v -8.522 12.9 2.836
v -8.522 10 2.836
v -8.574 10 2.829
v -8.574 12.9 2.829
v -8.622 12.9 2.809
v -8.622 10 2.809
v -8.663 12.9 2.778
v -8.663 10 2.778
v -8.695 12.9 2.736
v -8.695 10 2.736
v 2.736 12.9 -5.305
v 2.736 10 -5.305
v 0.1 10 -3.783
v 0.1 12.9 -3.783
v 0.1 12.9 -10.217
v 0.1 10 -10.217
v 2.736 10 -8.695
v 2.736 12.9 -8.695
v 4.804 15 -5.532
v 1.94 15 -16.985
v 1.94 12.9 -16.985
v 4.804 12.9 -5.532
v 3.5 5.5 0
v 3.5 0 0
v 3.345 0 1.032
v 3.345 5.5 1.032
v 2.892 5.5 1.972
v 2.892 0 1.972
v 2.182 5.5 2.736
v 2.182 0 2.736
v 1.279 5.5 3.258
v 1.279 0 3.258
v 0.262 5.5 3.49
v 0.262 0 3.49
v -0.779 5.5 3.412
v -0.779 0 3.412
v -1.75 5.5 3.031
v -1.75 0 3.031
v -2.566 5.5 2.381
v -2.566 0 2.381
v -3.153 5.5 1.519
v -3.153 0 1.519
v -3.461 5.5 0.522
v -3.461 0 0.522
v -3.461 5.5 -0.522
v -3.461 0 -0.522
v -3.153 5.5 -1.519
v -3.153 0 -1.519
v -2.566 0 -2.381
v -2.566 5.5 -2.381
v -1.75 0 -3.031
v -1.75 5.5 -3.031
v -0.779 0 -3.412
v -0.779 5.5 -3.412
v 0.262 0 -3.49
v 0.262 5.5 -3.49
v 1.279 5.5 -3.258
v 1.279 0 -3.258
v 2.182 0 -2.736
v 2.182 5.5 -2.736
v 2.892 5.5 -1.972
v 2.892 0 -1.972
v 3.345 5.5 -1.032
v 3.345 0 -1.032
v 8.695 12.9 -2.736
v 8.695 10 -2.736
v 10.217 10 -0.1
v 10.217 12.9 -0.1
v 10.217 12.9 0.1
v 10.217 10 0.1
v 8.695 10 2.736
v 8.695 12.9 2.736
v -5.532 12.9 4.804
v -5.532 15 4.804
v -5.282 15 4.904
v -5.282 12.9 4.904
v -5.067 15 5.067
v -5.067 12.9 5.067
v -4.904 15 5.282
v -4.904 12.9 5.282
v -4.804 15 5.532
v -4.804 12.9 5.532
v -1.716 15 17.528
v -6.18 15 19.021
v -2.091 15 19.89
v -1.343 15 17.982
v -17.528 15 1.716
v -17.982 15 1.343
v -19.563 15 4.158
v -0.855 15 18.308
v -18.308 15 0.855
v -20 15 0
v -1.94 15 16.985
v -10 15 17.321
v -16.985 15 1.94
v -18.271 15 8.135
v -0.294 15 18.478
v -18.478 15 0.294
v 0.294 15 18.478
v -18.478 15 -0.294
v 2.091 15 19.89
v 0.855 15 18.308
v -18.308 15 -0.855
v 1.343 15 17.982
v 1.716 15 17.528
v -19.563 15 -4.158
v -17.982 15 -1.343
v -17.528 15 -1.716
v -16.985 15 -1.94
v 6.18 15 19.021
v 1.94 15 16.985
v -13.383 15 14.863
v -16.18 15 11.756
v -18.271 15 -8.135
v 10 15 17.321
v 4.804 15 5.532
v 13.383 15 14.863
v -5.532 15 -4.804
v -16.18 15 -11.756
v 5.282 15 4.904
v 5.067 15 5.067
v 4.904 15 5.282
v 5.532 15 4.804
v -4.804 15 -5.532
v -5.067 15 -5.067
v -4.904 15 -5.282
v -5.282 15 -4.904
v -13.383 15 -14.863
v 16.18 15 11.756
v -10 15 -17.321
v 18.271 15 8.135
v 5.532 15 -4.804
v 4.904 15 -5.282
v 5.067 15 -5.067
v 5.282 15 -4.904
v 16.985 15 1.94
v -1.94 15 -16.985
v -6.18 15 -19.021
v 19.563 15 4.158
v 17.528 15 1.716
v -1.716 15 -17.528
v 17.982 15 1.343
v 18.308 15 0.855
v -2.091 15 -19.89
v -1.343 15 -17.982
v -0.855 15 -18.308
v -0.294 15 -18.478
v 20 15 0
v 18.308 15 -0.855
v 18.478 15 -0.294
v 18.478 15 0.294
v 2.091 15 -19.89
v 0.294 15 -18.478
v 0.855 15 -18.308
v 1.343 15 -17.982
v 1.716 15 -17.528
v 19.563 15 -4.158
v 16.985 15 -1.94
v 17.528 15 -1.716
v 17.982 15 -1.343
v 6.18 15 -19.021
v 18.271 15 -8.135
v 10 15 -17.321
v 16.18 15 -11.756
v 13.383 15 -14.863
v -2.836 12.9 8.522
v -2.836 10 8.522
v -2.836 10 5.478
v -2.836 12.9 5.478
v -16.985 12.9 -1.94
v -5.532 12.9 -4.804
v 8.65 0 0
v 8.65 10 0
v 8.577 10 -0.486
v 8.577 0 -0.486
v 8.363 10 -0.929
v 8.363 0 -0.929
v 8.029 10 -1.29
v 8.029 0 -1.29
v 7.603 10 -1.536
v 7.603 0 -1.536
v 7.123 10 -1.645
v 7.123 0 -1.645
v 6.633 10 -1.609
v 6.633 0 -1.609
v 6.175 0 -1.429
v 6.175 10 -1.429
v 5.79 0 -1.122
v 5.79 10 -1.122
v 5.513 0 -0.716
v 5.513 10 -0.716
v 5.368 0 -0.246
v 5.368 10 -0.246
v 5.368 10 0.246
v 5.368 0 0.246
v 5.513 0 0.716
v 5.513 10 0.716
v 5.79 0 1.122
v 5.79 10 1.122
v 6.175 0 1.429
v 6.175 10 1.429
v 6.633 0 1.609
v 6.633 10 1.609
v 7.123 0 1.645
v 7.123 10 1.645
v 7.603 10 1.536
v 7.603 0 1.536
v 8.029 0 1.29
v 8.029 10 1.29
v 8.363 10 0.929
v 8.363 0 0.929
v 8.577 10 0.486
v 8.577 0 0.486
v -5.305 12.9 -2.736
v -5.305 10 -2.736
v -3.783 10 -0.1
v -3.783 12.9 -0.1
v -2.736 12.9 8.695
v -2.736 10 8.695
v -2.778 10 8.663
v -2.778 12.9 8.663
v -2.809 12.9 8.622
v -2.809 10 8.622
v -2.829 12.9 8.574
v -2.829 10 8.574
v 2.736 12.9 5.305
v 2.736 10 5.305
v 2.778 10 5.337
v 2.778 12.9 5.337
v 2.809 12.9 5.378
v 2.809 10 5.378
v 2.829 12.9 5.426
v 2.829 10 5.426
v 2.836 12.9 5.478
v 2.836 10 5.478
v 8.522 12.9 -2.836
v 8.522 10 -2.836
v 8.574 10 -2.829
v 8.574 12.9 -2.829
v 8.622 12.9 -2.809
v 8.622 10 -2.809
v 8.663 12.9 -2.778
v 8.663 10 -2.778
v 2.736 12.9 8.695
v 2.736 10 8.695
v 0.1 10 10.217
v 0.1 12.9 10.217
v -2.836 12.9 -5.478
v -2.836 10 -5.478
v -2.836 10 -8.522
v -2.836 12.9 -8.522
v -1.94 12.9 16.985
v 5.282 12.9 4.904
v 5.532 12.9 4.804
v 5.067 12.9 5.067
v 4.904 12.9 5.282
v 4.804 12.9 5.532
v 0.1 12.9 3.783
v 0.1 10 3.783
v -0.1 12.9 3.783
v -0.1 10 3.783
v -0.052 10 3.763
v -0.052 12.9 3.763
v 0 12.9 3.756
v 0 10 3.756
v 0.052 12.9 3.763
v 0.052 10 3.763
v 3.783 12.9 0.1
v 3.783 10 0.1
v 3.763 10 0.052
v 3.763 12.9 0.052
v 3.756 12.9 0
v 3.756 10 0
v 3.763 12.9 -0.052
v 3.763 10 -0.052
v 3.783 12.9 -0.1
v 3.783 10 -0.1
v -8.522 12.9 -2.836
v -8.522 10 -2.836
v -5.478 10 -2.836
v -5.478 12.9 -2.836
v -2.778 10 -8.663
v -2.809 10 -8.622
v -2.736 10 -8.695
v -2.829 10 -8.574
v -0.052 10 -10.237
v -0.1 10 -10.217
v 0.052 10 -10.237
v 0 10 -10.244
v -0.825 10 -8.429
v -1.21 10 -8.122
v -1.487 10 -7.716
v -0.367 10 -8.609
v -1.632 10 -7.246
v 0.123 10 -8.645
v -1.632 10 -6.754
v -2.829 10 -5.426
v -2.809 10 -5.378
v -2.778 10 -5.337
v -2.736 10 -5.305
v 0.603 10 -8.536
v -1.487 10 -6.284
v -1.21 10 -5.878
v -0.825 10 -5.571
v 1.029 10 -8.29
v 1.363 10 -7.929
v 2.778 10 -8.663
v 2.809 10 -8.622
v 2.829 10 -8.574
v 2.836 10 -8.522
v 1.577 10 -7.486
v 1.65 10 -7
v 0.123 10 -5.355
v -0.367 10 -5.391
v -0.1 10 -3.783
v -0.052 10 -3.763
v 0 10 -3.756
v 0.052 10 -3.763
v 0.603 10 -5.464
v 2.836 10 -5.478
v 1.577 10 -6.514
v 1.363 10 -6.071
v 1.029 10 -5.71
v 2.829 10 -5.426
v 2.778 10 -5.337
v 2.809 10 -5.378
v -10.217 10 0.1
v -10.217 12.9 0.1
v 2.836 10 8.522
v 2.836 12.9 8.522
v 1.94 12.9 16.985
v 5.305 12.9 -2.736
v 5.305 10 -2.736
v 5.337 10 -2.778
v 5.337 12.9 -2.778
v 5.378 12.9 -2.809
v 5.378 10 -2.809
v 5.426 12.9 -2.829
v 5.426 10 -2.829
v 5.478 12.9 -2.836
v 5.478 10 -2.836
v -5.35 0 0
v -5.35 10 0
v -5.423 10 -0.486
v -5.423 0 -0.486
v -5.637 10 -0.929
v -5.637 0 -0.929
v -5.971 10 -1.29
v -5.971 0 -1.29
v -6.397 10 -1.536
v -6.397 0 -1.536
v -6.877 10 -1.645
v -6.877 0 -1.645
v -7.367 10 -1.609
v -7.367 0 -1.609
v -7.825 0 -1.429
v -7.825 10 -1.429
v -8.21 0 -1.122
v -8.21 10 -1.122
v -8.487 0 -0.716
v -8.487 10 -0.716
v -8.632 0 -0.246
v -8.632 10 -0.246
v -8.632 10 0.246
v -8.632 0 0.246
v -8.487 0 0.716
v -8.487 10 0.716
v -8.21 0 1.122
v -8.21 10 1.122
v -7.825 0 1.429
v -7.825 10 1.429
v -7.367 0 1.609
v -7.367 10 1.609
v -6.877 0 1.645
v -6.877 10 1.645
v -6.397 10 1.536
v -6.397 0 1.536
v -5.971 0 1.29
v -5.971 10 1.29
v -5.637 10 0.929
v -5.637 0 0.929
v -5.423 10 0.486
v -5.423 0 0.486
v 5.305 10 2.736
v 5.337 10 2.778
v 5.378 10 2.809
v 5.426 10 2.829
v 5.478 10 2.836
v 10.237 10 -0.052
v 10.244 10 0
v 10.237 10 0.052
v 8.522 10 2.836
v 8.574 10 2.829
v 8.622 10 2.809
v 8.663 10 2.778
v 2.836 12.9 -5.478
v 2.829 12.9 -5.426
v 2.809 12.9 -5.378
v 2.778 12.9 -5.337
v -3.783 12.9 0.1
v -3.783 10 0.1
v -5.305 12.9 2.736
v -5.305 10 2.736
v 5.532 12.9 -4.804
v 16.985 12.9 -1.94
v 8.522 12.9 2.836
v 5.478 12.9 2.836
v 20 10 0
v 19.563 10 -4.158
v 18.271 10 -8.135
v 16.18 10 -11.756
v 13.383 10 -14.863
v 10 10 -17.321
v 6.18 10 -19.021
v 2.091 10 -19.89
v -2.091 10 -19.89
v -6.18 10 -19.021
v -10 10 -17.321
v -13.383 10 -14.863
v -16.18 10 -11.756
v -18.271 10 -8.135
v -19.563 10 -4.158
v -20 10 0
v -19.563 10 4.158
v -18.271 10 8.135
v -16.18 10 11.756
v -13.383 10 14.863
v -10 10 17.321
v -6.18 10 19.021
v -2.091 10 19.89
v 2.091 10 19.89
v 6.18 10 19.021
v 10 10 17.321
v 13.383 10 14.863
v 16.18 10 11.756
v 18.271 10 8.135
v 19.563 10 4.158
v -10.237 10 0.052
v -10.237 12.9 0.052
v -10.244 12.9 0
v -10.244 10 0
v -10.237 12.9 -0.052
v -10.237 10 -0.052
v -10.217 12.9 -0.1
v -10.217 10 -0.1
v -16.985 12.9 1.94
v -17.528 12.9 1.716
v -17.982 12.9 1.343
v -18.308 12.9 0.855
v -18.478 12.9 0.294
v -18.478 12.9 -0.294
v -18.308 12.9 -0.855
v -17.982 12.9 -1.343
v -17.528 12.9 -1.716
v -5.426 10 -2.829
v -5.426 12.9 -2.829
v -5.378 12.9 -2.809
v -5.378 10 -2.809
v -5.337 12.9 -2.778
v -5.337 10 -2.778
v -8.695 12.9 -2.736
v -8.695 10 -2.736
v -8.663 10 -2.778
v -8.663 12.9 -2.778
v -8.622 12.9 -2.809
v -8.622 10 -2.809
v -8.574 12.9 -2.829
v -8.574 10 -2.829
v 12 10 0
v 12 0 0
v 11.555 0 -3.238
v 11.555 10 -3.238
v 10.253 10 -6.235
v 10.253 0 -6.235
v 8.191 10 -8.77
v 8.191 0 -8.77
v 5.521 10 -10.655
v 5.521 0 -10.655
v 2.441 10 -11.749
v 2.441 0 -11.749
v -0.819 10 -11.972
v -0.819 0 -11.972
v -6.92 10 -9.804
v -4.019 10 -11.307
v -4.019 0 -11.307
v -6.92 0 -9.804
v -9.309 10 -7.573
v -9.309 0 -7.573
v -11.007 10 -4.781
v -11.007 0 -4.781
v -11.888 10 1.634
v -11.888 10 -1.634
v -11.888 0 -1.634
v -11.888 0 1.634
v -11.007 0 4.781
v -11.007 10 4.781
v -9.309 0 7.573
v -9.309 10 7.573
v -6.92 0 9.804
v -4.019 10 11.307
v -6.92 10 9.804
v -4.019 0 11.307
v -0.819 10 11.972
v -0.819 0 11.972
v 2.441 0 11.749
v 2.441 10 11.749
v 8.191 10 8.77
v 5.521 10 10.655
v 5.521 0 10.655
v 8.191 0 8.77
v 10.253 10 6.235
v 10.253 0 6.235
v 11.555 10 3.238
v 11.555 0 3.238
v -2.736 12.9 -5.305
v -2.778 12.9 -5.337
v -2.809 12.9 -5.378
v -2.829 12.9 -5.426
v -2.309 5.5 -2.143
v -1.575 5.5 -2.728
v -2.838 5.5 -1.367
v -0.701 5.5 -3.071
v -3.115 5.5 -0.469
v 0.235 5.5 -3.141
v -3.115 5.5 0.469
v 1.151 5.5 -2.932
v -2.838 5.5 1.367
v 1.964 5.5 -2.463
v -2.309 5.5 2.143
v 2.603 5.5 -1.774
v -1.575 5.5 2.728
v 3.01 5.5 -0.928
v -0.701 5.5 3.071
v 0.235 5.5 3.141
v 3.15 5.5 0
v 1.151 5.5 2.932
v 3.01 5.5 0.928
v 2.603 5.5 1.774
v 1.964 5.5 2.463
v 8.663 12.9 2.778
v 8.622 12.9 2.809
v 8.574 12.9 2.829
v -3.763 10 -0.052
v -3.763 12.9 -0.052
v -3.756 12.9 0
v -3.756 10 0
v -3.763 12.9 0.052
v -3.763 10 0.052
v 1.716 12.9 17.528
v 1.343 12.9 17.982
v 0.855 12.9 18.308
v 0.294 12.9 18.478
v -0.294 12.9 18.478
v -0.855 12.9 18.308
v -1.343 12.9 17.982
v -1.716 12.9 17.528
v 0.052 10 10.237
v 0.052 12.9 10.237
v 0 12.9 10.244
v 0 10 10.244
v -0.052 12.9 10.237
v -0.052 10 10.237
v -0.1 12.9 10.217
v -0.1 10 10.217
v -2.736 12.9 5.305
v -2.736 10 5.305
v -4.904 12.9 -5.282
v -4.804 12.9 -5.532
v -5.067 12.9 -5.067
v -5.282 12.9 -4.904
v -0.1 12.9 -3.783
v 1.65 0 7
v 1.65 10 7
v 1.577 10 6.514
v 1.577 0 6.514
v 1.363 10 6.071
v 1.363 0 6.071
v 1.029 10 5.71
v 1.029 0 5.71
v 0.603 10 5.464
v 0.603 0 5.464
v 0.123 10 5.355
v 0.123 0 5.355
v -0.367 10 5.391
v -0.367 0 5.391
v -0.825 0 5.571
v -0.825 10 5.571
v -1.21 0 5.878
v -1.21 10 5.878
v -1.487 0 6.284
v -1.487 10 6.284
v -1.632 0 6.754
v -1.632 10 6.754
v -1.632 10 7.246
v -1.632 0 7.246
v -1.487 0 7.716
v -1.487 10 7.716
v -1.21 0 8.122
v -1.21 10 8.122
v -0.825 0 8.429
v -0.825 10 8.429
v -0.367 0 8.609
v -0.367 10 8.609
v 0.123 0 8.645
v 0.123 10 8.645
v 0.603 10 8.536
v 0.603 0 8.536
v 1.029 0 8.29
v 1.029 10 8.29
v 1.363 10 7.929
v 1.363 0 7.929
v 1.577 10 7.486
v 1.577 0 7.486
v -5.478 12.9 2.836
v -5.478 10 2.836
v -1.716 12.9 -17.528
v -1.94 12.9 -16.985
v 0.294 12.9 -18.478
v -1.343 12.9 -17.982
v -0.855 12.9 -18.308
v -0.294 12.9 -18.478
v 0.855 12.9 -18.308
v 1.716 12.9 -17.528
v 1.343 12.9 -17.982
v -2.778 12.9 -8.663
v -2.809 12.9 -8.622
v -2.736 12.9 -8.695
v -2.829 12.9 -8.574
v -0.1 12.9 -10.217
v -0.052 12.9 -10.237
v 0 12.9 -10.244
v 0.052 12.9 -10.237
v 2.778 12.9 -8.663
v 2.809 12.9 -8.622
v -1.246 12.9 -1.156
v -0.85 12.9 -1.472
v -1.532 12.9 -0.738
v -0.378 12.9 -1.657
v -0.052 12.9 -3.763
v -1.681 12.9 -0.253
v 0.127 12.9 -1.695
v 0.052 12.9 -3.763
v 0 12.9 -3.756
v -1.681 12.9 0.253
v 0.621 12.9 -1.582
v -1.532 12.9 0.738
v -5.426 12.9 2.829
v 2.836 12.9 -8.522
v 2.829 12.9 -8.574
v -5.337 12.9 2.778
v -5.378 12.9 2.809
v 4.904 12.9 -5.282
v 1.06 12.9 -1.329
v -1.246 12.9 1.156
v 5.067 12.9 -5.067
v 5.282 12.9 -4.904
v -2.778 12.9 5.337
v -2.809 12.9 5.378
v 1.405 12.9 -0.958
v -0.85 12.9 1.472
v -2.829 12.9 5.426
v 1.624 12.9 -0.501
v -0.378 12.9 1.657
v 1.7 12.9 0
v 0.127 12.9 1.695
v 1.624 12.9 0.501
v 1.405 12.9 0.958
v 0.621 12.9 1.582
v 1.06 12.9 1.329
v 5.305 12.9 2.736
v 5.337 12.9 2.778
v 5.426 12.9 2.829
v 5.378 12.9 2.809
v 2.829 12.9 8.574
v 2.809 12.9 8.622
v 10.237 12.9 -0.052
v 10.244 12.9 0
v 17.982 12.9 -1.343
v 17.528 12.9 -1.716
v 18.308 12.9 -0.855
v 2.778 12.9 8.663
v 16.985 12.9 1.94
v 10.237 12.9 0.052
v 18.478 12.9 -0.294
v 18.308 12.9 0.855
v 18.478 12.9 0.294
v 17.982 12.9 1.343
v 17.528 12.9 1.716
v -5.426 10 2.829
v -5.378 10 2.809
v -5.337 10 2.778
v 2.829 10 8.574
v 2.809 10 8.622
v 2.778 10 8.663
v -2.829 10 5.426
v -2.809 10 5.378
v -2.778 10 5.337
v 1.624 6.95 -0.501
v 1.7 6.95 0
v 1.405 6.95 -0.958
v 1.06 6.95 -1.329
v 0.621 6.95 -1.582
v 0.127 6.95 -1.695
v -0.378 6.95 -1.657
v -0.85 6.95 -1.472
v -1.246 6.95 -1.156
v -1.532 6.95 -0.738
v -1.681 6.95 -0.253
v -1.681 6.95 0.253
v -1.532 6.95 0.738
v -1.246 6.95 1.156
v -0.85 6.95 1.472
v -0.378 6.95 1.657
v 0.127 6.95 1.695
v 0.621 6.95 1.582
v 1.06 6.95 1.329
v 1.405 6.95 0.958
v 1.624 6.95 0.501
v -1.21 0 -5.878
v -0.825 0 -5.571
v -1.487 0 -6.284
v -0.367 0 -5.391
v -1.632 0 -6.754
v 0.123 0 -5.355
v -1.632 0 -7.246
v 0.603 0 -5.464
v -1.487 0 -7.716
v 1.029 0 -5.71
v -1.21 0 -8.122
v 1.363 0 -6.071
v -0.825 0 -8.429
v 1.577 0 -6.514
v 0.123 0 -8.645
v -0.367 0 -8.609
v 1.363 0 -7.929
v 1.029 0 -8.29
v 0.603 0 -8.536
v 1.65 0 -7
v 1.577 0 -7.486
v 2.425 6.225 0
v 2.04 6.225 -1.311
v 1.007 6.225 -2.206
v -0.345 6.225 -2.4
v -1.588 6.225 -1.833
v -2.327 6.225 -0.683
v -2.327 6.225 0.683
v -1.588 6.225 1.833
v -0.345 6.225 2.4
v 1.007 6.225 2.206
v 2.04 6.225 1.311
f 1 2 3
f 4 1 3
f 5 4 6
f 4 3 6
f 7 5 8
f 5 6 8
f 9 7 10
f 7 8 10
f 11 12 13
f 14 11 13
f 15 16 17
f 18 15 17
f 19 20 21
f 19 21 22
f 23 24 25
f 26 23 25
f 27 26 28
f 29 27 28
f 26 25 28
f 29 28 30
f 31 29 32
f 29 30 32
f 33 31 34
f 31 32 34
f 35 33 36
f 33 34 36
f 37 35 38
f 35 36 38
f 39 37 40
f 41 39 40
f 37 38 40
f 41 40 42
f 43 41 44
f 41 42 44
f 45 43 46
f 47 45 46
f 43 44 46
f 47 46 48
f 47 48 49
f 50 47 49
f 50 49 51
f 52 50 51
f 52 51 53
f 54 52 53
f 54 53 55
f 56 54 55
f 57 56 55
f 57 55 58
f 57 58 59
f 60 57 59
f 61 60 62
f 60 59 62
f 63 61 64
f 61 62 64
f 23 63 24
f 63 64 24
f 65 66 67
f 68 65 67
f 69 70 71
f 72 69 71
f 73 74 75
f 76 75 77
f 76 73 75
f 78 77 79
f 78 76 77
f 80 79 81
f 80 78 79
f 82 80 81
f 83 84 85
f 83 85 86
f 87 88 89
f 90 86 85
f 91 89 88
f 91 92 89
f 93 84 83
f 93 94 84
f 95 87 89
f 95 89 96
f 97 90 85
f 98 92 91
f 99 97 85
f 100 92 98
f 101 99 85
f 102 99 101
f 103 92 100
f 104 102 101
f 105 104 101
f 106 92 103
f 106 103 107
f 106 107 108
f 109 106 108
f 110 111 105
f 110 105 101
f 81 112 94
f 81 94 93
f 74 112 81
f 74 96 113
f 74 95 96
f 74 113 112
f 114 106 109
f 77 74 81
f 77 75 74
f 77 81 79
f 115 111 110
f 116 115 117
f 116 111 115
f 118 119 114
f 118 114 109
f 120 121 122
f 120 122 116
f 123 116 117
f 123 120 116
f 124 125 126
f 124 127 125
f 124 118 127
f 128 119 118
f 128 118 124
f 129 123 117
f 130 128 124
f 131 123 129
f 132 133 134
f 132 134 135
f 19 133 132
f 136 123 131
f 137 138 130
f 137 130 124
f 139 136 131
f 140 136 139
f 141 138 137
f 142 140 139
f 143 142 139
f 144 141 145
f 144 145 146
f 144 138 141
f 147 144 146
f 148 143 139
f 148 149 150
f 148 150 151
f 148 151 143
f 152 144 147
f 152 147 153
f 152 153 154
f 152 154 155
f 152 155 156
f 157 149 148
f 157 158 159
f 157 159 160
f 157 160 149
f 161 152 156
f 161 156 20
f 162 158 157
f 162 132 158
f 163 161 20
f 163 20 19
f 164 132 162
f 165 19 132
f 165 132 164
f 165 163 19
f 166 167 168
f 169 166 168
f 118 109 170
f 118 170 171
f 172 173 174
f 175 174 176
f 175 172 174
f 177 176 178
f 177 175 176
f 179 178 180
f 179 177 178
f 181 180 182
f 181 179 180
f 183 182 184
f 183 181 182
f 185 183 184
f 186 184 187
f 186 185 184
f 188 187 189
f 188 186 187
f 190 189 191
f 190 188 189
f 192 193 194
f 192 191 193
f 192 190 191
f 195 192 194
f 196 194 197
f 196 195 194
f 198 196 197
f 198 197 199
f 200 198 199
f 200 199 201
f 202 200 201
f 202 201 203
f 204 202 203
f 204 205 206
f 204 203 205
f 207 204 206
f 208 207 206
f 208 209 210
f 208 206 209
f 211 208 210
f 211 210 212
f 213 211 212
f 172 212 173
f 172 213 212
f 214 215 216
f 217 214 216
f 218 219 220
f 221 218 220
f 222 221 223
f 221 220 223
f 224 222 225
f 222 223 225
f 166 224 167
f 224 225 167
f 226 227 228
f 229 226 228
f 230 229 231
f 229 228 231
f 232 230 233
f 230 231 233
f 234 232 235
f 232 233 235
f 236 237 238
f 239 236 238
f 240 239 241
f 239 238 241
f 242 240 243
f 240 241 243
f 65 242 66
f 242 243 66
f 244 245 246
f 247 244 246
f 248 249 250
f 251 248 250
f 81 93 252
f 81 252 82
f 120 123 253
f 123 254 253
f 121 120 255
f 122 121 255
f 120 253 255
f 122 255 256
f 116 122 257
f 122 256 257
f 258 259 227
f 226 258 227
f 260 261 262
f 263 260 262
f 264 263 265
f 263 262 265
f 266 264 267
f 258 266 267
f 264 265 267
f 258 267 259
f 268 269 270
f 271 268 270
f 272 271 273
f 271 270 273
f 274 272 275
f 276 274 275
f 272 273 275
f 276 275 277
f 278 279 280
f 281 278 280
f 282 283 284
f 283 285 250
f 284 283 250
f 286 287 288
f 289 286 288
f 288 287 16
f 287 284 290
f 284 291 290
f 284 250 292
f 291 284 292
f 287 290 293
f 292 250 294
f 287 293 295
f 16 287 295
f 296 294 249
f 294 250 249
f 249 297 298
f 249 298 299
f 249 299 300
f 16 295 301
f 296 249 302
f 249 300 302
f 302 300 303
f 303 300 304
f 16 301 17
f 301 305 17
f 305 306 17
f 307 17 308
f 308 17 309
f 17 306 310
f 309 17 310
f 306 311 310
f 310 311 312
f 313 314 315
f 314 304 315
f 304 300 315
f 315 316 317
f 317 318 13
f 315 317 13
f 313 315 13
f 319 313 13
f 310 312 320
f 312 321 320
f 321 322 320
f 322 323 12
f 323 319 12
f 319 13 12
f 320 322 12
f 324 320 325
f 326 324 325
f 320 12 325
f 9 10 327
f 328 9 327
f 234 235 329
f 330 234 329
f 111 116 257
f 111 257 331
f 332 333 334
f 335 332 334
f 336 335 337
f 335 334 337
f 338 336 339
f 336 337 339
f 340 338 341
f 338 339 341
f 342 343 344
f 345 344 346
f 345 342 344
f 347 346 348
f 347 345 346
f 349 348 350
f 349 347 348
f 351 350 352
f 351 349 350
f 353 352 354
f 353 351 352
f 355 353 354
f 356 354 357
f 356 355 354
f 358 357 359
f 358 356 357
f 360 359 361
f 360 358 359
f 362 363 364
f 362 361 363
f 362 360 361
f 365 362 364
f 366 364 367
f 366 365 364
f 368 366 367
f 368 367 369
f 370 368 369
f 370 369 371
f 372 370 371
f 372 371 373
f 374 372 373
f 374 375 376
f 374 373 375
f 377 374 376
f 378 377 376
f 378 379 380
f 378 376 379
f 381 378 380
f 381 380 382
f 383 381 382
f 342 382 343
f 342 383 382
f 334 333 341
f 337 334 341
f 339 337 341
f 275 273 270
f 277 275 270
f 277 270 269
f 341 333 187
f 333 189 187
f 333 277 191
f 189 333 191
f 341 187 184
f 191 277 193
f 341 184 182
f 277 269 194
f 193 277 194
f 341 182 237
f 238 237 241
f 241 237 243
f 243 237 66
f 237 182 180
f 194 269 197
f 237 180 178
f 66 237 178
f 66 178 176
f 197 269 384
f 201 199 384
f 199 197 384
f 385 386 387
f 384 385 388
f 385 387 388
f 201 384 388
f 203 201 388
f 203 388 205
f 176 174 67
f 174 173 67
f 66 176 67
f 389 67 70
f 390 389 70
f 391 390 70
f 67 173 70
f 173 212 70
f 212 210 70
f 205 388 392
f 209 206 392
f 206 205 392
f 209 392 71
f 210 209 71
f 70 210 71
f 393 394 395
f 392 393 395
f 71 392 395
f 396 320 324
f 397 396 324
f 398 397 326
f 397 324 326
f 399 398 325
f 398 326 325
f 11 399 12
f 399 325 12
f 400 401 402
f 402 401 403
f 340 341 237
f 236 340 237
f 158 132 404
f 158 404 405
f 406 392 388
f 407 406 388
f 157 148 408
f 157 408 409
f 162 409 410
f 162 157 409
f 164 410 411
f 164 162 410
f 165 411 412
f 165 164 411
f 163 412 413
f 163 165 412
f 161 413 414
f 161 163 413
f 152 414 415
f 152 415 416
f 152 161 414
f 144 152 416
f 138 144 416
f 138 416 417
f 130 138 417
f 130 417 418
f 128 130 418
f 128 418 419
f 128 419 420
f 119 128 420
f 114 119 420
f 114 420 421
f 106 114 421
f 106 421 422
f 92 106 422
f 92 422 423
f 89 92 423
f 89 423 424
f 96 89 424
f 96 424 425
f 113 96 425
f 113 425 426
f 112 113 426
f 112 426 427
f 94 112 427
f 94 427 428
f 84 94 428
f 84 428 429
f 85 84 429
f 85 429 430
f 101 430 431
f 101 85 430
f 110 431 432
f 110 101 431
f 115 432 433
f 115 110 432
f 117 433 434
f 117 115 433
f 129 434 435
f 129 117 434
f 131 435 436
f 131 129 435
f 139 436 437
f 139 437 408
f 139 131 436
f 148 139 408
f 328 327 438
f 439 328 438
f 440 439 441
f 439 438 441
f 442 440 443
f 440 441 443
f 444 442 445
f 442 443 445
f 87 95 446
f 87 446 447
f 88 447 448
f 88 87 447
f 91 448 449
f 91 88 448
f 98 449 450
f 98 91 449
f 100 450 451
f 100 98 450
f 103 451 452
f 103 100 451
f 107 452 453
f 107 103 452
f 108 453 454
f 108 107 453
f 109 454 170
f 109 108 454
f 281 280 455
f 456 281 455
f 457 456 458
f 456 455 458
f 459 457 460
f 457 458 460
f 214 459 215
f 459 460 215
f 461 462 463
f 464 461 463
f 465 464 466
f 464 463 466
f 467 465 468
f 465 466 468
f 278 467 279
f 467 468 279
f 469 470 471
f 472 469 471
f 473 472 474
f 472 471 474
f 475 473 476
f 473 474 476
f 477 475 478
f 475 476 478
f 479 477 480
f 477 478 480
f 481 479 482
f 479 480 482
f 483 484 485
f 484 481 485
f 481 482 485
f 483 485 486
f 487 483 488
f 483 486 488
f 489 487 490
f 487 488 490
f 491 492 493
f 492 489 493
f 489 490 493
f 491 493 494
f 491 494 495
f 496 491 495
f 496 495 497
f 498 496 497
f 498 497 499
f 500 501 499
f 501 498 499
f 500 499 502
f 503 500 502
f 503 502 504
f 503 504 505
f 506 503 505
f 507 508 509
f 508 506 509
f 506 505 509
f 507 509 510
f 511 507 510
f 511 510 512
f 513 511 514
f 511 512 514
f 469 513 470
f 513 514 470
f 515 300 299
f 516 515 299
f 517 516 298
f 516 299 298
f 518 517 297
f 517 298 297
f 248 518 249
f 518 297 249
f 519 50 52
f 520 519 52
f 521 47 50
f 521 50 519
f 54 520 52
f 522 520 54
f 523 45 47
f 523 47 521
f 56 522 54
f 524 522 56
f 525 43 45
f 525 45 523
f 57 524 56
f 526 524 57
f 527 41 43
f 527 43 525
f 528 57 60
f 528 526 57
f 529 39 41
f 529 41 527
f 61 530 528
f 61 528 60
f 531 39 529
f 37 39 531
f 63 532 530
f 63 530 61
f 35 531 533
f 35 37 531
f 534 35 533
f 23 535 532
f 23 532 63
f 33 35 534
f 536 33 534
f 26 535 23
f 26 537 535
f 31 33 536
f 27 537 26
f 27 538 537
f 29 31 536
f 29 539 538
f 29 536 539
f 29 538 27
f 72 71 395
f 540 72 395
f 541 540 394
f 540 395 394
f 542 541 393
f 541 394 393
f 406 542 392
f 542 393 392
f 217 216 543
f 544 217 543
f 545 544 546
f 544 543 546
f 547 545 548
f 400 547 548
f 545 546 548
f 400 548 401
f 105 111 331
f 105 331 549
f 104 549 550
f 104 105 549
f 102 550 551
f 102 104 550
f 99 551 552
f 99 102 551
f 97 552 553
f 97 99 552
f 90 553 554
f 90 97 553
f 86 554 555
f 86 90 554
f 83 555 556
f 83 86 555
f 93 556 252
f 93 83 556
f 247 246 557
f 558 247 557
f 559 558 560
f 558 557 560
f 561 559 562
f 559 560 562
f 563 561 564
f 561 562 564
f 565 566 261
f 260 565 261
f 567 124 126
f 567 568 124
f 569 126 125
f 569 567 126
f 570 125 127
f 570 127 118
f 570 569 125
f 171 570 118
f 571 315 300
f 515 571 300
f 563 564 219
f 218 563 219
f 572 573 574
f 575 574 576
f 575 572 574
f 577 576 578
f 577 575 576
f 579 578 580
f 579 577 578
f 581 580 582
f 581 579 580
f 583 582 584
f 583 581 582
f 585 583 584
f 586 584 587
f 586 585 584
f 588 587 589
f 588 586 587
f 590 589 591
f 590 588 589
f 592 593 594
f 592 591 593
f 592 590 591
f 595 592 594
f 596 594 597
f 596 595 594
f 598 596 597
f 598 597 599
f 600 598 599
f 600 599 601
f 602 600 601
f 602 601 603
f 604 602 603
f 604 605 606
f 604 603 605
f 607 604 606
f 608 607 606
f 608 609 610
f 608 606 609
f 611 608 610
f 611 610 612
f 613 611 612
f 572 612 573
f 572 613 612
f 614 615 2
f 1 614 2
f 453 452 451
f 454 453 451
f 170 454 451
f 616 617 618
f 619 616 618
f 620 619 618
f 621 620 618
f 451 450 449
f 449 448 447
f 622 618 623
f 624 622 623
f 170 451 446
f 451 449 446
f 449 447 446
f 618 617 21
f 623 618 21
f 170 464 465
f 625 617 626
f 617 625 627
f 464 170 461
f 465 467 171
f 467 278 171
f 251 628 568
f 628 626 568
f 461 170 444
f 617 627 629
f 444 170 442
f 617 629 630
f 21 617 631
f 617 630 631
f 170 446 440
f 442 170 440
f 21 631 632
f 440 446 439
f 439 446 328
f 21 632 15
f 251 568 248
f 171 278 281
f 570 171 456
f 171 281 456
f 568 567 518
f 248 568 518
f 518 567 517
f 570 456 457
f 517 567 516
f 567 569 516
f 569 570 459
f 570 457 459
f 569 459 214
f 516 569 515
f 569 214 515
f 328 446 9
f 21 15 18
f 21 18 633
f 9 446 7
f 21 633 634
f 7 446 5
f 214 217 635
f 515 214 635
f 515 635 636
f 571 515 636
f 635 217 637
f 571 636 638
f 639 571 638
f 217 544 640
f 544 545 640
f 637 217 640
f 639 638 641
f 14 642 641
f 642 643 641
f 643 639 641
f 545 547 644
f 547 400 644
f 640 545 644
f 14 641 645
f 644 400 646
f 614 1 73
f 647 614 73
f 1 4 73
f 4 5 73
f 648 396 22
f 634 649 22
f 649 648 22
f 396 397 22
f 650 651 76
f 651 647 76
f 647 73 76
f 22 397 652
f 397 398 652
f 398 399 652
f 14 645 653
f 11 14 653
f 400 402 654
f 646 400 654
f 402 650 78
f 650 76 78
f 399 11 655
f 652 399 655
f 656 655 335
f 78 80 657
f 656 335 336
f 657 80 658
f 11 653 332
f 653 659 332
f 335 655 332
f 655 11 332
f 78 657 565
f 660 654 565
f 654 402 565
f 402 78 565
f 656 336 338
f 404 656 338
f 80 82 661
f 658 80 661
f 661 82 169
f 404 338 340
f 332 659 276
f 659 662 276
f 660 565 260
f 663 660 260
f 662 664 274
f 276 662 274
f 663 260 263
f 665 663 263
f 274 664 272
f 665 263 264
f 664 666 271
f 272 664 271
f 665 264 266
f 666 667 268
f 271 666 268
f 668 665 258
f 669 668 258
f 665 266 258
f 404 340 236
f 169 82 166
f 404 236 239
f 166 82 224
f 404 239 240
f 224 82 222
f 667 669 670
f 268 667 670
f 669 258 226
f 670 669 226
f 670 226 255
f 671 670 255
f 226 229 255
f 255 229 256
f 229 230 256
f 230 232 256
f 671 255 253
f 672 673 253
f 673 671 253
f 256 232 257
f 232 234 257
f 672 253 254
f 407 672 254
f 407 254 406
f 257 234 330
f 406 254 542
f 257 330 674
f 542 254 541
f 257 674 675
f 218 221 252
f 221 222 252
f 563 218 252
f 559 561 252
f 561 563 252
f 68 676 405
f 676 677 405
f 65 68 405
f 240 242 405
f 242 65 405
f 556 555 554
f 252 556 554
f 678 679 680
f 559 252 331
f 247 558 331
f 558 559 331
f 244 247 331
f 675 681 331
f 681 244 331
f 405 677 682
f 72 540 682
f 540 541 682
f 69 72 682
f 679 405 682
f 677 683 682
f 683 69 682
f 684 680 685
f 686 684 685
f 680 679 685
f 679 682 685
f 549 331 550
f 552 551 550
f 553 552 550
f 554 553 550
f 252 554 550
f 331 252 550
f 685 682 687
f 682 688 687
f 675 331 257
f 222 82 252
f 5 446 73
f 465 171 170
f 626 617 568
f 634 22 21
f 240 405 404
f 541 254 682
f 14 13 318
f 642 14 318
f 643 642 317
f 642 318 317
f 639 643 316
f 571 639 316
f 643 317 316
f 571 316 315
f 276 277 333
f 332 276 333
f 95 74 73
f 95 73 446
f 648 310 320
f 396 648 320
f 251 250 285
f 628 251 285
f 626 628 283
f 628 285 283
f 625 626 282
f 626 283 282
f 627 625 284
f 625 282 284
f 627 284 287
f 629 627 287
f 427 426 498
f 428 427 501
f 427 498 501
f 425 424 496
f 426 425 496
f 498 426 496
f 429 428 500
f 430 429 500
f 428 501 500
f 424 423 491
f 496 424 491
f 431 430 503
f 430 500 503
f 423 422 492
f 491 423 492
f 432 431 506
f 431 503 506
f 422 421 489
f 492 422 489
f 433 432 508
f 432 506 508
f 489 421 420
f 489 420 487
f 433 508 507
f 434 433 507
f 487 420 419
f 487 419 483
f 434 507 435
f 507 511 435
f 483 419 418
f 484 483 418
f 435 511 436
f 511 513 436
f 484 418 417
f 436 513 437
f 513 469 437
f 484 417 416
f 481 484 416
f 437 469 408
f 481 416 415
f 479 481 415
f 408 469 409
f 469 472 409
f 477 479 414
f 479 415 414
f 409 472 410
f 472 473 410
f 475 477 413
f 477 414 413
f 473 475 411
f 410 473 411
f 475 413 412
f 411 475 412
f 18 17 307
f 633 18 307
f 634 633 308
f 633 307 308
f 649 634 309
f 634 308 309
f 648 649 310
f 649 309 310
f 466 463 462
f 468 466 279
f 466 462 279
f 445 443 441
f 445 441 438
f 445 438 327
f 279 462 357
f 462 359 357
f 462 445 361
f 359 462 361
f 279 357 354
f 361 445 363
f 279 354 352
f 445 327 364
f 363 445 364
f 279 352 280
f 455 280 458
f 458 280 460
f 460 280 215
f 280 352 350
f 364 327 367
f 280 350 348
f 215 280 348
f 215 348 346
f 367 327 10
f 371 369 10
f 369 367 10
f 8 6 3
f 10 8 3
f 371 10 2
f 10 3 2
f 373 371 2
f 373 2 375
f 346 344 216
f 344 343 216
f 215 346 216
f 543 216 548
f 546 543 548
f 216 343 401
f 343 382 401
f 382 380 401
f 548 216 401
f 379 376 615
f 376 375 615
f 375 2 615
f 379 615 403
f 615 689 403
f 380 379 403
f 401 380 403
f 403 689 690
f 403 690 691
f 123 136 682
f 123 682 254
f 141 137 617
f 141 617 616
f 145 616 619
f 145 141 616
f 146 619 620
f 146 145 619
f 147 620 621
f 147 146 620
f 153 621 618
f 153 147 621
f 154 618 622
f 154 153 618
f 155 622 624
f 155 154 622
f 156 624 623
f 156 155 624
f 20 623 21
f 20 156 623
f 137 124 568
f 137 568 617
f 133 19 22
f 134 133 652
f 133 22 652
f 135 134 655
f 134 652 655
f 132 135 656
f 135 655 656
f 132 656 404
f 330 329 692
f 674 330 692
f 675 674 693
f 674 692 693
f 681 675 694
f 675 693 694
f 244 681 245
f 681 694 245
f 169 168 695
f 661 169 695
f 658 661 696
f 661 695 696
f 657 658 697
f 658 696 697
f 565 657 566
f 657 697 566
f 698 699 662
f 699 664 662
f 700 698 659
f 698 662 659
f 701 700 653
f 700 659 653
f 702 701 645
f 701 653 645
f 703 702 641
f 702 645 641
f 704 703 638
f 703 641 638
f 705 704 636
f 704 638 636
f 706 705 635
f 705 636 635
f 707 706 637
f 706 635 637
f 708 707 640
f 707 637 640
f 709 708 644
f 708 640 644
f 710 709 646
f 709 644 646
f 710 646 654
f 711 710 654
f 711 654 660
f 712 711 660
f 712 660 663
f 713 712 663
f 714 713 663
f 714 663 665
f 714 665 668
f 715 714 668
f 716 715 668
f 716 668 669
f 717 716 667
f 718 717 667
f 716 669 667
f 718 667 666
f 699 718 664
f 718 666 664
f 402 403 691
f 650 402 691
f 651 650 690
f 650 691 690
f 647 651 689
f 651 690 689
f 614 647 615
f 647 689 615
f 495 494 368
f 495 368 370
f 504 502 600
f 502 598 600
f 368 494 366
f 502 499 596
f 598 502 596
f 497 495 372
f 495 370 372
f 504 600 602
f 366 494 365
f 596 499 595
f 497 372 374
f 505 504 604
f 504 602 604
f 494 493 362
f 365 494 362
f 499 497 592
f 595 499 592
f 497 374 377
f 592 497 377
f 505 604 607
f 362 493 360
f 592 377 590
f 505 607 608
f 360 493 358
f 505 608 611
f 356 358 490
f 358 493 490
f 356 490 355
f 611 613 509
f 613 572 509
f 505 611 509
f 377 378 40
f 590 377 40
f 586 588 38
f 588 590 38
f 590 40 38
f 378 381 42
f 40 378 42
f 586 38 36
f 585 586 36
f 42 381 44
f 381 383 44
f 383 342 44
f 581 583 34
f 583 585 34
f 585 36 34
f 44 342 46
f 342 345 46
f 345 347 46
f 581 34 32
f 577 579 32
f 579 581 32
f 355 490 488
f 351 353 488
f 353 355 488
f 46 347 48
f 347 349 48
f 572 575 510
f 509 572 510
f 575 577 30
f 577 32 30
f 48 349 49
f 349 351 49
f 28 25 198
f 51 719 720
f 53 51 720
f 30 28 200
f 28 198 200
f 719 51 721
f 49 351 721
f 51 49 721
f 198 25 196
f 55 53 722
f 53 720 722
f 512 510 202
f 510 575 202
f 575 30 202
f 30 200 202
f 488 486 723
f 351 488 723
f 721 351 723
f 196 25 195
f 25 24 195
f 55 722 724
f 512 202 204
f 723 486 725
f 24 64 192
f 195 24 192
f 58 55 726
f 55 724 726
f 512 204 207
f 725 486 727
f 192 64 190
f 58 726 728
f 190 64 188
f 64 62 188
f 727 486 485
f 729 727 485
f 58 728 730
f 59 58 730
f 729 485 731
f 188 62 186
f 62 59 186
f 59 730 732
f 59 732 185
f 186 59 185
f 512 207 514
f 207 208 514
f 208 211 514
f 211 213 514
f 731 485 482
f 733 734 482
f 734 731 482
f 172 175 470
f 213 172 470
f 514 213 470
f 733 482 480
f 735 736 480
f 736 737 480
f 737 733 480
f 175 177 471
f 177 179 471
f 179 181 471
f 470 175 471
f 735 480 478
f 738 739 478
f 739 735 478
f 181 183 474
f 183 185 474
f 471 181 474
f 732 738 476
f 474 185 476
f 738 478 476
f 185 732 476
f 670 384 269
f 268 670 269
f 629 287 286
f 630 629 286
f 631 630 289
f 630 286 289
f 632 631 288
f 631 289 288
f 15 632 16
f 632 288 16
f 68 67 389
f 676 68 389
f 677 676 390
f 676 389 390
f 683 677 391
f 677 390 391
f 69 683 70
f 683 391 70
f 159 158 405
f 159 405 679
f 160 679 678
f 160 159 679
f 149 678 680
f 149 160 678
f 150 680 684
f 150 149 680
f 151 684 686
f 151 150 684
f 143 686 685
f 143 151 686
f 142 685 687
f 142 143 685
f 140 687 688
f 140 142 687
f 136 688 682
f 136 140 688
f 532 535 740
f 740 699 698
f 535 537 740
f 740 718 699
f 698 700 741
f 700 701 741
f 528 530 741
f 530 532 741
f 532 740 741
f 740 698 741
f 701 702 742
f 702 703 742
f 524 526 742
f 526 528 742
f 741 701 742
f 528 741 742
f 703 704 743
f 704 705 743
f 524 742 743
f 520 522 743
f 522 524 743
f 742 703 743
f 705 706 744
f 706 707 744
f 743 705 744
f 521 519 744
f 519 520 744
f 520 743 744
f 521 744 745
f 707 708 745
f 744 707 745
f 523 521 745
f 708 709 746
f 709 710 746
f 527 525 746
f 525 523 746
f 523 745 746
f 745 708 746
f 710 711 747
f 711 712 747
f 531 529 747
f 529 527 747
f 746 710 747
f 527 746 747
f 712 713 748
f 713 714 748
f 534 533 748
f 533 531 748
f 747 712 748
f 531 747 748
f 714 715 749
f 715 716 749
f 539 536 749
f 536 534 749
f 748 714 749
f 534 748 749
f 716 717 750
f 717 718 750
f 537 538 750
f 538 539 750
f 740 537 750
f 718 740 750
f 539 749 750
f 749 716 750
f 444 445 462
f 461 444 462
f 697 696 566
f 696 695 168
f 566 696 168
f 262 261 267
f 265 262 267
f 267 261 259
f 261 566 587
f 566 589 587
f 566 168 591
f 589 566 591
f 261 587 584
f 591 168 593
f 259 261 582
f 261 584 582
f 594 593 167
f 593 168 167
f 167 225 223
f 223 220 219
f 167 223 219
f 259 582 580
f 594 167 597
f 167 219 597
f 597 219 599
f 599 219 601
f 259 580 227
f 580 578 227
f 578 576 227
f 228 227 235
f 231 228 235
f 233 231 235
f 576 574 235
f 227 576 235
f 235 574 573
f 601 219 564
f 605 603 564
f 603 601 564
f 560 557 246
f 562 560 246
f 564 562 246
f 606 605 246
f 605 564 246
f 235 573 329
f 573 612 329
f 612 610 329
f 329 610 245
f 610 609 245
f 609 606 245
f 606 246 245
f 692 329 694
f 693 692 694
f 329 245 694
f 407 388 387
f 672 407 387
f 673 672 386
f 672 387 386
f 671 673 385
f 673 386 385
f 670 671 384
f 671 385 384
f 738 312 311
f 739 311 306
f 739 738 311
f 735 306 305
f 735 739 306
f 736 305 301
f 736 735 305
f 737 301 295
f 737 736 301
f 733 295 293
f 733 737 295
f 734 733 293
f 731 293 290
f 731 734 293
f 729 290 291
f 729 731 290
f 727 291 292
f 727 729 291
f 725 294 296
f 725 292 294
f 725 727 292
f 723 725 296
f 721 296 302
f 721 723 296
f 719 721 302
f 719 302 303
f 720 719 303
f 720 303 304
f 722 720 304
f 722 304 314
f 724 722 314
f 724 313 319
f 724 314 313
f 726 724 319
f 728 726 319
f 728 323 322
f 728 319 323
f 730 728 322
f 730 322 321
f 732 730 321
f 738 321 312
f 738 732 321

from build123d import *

# Parameters (mm, degrees)
SKETCH1_R                                       = 12
SKETCH1_R_2                                     = 1.65
BOSS_EXTRUDE1_DEPTH                             = 15
SKETCH2_R                                       = 20
SKETCH2_R_2                                     = 11.285963192
BOSS_EXTRUDE2_DEPTH                             = 5
SKETCH3_R                                       = 20
BOSS_EXTRUDE3_DEPTH                             = 3
CUT_EXTRUDE2_DEPTH                              = 2.1
SKETCH6_R                                       = 1.65
CUT_EXTRUDE3_DEPTH                              = 24.1
FILLET1_R                                       = 1
SKETCH7_R                                       = 3.5
CUT_EXTRUDE4_DEPTH                              = 5.5
CSK_FOR_M3_FLAT_HEAD_MACHINE_SCREW1_D           = 3.4
CSK_FOR_M3_FLAT_HEAD_MACHINE_SCREW1_CSINK_D     = 6.3
CSK_FOR_M3_FLAT_HEAD_MACHINE_SCREW1_CSINK_ANGLE = 90
CUT_EXTRUDE6_DEPTH                              = 2
CUT_EXTRUDE6_DEPTH_BACK                         = 10


with BuildPart() as part:
    # Sketch1 → Boss-Extrude1 (new body)
    with BuildSketch(Plane(origin=(0, 0, 0), x_dir=(1, 0, 0), z_dir=(0, 1, 0))):
        Circle(SKETCH1_R)
        with Locations((0, 7)):
            Circle(SKETCH1_R_2, mode=Mode.SUBTRACT)
        with Locations((7, 0)):
            Circle(SKETCH1_R_2, mode=Mode.SUBTRACT)
        Circle(SKETCH1_R_2, mode=Mode.SUBTRACT)
        with Locations((0, -7)):
            Circle(SKETCH1_R_2, mode=Mode.SUBTRACT)
        with Locations((-7, 0)):
            Circle(SKETCH1_R_2, mode=Mode.SUBTRACT)
    extrude(amount=BOSS_EXTRUDE1_DEPTH)

    # Sketch2 → Boss-Extrude2 (add)
    with BuildSketch(Plane(origin=(0, 15, 0), x_dir=(1, 0, 0), z_dir=(0, 1, 0))):
        Circle(SKETCH2_R)
        Circle(SKETCH2_R_2, mode=Mode.SUBTRACT)
    extrude(amount=-BOSS_EXTRUDE2_DEPTH)

    # Sketch3 → Boss-Extrude3 (add)
    with BuildSketch(Plane(origin=(0, 15, 0), x_dir=(1, 0, 0), z_dir=(0, 1, 0))):
        Circle(SKETCH3_R)
    extrude(amount=-BOSS_EXTRUDE3_DEPTH)

    # Sketch4 → Cut-Extrude2 (cut)
    with BuildSketch(Plane.XZ.offset(-15)):
        with BuildLine():
            Line((4.949747468, 4.949747468), (1.940261042, 16.98516707))
            ThreePointArc((1.940261042, 16.98516707), (0, 18.5), (-1.940261043, 16.98516707))
            Line((-1.940261043, 16.98516707), (-4.949747468, 4.949747468))
            Line((-4.949747468, 4.949747468), (-16.98516707, 1.940261042))
            ThreePointArc((-16.98516707, 1.940261042), (-18.5, 0), (-16.98516707, -1.940261043))
            Line((-16.98516707, -1.940261043), (-4.949747468, -4.949747468))
            Line((-4.949747468, -4.949747468), (-1.940261042, -16.98516707))
            ThreePointArc((-1.940261042, -16.98516707), (0, -18.5), (1.940261043, -16.98516707))
            Line((1.940261043, -16.98516707), (4.949747468, -4.949747468))
            Line((4.949747468, -4.949747468), (16.98516707, -1.940261042))
            ThreePointArc((16.98516707, -1.940261042), (18.5, 0), (16.98516707, 1.940261043))
            Line((16.98516707, 1.940261043), (4.949747468, 4.949747468))
        make_face()
    extrude(amount=CUT_EXTRUDE2_DEPTH, mode=Mode.SUBTRACT)

    # Sketch6 → Cut-Extrude3 (cut)
    with BuildSketch(Plane.XZ):
        Circle(SKETCH6_R)
    extrude(amount=-CUT_EXTRUDE3_DEPTH, mode=Mode.SUBTRACT)

    # Fillet1
    fillet1_edges = [part.edges().sort_by_distance(p)[0] for p in [
        (4.949747468, 13.95, 4.949747468),
        (-4.949747468, 13.95, 4.949747468),
        (-4.949747468, 13.95, -4.949747468),
        (4.949747468, 13.95, -4.949747468),
    ]]
    fillet(fillet1_edges, radius=FILLET1_R)

    # Sketch7 → Cut-Extrude4 (cut)
    with BuildSketch(Plane.XZ):
        Circle(SKETCH7_R)
    extrude(amount=-CUT_EXTRUDE4_DEPTH, mode=Mode.SUBTRACT)

    # CSK for M3 Flat Head Machine Screw1 (through all)
    with Locations(Plane(origin=(0, 5.5, 0), x_dir=(-1, 0, 0), z_dir=(0, -1, 0))):
        with Locations((0, 0)):
            CounterSinkHole(CSK_FOR_M3_FLAT_HEAD_MACHINE_SCREW1_D / 2, CSK_FOR_M3_FLAT_HEAD_MACHINE_SCREW1_CSINK_D / 2, counter_sink_angle=CSK_FOR_M3_FLAT_HEAD_MACHINE_SCREW1_CSINK_ANGLE)

    # Sketch12 → Cut-Extrude6 (cut, two sides)
    with BuildSketch(Plane.XZ.offset(-12)) as cut_extrude6_sk:
        with BuildLine():
            Line((-2.836233197, 8.522029946), (-2.836233197, 5.477970054))
            ThreePointArc((-2.836233197, 5.477970054), (-2.809438278, 5.377970054), (-2.736233197, 5.304764973))
            Line((-2.736233197, 5.304764973), (-0.1, 3.782735027))
            ThreePointArc((-0.1, 3.782735027), (0, 3.755940108), (0.1, 3.782735027))
            Line((0.1, 3.782735027), (2.736233197, 5.304764973))
            ThreePointArc((2.736233197, 5.304764973), (2.809438278, 5.377970054), (2.836233197, 5.477970054))
            Line((2.836233197, 5.477970054), (2.836233197, 8.522029946))
            ThreePointArc((2.836233197, 8.522029946), (2.809438278, 8.622029946), (2.736233197, 8.695235027))
            Line((2.736233197, 8.695235027), (0.1, 10.217264973))
            ThreePointArc((0.1, 10.217264973), (0, 10.244059892), (-0.1, 10.217264973))
            Line((-0.1, 10.217264973), (-2.736233197, 8.695235027))
            ThreePointArc((-2.736233197, 8.695235027), (-2.809438278, 8.622029946), (-2.836233197, 8.522029946))
        make_face()
        with BuildLine():
            Line((-10.217264973, -0.1), (-8.695235027, -2.736233197))
            ThreePointArc((-8.695235027, -2.736233197), (-8.622029946, -2.809438278), (-8.522029946, -2.836233197))
            Line((-8.522029946, -2.836233197), (-5.477970054, -2.836233197))
            ThreePointArc((-5.477970054, -2.836233197), (-5.377970054, -2.809438278), (-5.304764973, -2.736233197))
            Line((-5.304764973, -2.736233197), (-3.782735027, -0.1))
            ThreePointArc((-3.782735027, -0.1), (-3.755940108, 0), (-3.782735027, 0.1))
            Line((-3.782735027, 0.1), (-5.304764973, 2.736233197))
            ThreePointArc((-5.304764973, 2.736233197), (-5.377970054, 2.809438278), (-5.477970054, 2.836233197))
            Line((-5.477970054, 2.836233197), (-8.522029946, 2.836233197))
            ThreePointArc((-8.522029946, 2.836233197), (-8.622029946, 2.809438278), (-8.695235027, 2.736233197))
            Line((-8.695235027, 2.736233197), (-10.217264973, 0.1))
            ThreePointArc((-10.217264973, 0.1), (-10.244059892, 0), (-10.217264973, -0.1))
        make_face()
        with BuildLine():
            Line((8.522029946, 2.836233197), (5.477970054, 2.836233197))
            ThreePointArc((5.477970054, 2.836233197), (5.377970054, 2.809438278), (5.304764973, 2.736233197))
            Line((5.304764973, 2.736233197), (3.782735027, 0.1))
            ThreePointArc((3.782735027, 0.1), (3.755940108, 0), (3.782735027, -0.1))
            Line((3.782735027, -0.1), (5.304764973, -2.736233197))
            ThreePointArc((5.304764973, -2.736233197), (5.377970054, -2.809438278), (5.477970054, -2.836233197))
            Line((5.477970054, -2.836233197), (8.522029946, -2.836233197))
            ThreePointArc((8.522029946, -2.836233197), (8.622029946, -2.809438278), (8.695235027, -2.736233197))
            Line((8.695235027, -2.736233197), (10.217264973, -0.1))
            ThreePointArc((10.217264973, -0.1), (10.244059892, 0), (10.217264973, 0.1))
            Line((10.217264973, 0.1), (8.695235027, 2.736233197))
            ThreePointArc((8.695235027, 2.736233197), (8.622029946, 2.809438278), (8.522029946, 2.836233197))
        make_face()
        with BuildLine():
            Line((2.836233197, -8.522029946), (2.836233197, -5.477970054))
            ThreePointArc((2.836233197, -5.477970054), (2.809438278, -5.377970054), (2.736233197, -5.304764973))
            Line((2.736233197, -5.304764973), (0.1, -3.782735027))
            ThreePointArc((0.1, -3.782735027), (0, -3.755940108), (-0.1, -3.782735027))
            Line((-0.1, -3.782735027), (-2.736233197, -5.304764973))
            ThreePointArc((-2.736233197, -5.304764973), (-2.809438278, -5.377970054), (-2.836233197, -5.477970054))
            Line((-2.836233197, -5.477970054), (-2.836233197, -8.522029946))
            ThreePointArc((-2.836233197, -8.522029946), (-2.809438278, -8.622029946), (-2.736233197, -8.695235027))
            Line((-2.736233197, -8.695235027), (-0.1, -10.217264973))
            ThreePointArc((-0.1, -10.217264973), (0, -10.244059892), (0.1, -10.217264973))
            Line((0.1, -10.217264973), (2.736233197, -8.695235027))
            ThreePointArc((2.736233197, -8.695235027), (2.809438278, -8.622029946), (2.836233197, -8.522029946))
        make_face()
    extrude(amount=CUT_EXTRUDE6_DEPTH, mode=Mode.SUBTRACT)
    extrude(cut_extrude6_sk.sketch, amount=-CUT_EXTRUDE6_DEPTH_BACK, mode=Mode.SUBTRACT)


solid = part.part
